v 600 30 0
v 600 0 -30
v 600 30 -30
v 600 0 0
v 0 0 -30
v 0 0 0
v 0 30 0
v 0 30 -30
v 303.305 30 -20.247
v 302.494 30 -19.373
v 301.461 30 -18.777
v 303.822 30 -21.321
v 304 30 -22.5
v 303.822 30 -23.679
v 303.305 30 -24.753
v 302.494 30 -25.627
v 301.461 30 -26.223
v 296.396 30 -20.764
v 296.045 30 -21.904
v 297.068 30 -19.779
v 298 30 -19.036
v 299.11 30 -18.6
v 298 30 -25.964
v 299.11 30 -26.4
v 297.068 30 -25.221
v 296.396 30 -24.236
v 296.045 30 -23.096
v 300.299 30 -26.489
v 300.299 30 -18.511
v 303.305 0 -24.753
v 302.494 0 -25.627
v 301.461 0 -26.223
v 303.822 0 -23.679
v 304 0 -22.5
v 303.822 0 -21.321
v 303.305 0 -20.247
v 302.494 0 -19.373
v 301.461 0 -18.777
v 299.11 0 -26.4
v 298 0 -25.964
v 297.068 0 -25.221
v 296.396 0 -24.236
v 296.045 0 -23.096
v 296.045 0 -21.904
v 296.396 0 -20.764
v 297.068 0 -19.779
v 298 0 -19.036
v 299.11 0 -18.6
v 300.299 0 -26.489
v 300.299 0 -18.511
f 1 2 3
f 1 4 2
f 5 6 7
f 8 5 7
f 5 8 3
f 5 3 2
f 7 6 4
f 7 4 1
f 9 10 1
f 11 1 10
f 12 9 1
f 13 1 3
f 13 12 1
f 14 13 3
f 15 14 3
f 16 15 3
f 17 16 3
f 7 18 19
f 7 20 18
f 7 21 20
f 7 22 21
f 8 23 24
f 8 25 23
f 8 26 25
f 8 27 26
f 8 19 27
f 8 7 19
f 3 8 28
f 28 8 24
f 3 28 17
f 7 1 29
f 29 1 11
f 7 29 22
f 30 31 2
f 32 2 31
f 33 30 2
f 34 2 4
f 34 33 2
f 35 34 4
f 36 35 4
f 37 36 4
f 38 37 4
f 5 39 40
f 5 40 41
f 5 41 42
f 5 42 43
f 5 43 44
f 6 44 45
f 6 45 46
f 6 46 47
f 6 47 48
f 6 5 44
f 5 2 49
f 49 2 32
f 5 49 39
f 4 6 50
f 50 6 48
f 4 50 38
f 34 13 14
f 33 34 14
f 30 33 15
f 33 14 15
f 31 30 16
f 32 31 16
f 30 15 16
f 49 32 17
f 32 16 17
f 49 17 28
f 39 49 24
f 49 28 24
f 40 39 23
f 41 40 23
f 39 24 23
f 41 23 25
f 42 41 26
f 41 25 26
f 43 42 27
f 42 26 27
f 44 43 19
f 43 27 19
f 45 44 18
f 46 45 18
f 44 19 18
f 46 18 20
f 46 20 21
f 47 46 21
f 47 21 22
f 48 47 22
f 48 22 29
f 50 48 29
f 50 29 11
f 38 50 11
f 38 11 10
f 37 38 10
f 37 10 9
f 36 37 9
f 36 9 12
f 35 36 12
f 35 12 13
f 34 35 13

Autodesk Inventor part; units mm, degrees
ref_plane "YZ Plane" through (0, 0, 0) normal (1, 0, 0) x (0, 1, 0)
ref_plane "XZ Plane" through (0, 0, 0) normal (0, 1, 0) x (-1, 0, 0)
ref_plane "XY Plane" through (0, 0, 0) normal (0, 0, 1) x (1, 0, 0)
sketch "Sketch1" plane through (0, 0, 0) normal (1, 0, 0) x (0, 1, 0)
  line L0 (0, 0) -> (30, 0)
  line L1 (30, 0) -> (30, -30)
  line L2 (30, -30) -> (0, -30)
  line L3 (0, -30) -> (0, 0)
  dimension "d0" = 30
  dimension "d1" = 30
extrude "Extrusion1" add sketch "Sketch1" along normal blind 600
sketch "Sketch2" plane through (0, 30, 0) normal (0, 1, 0) x (1, 0, 0)
  circle A0 centre (300, 22.5) radius 4
  line L0 (0, 0) -> (600, 0) projected
  line L1 (0, 30) -> (0, 0) projected
  line L2 (600, 30) -> (600, 0) projected
  dimension "d4" = 8
  dimension "d5" = 22.5
  dimension "d6" = 300
  dimension "d7" = 600
extrude "Extrusion2" cut sketch "Sketch2" against normal through all
thread "Thread1" size "TR8x1.5" class "7H" standard "ISO Metric Trapezoidal Threads" full length
equation "\"d6\" = 0.5 * d7"
properties part number "Piston_"
